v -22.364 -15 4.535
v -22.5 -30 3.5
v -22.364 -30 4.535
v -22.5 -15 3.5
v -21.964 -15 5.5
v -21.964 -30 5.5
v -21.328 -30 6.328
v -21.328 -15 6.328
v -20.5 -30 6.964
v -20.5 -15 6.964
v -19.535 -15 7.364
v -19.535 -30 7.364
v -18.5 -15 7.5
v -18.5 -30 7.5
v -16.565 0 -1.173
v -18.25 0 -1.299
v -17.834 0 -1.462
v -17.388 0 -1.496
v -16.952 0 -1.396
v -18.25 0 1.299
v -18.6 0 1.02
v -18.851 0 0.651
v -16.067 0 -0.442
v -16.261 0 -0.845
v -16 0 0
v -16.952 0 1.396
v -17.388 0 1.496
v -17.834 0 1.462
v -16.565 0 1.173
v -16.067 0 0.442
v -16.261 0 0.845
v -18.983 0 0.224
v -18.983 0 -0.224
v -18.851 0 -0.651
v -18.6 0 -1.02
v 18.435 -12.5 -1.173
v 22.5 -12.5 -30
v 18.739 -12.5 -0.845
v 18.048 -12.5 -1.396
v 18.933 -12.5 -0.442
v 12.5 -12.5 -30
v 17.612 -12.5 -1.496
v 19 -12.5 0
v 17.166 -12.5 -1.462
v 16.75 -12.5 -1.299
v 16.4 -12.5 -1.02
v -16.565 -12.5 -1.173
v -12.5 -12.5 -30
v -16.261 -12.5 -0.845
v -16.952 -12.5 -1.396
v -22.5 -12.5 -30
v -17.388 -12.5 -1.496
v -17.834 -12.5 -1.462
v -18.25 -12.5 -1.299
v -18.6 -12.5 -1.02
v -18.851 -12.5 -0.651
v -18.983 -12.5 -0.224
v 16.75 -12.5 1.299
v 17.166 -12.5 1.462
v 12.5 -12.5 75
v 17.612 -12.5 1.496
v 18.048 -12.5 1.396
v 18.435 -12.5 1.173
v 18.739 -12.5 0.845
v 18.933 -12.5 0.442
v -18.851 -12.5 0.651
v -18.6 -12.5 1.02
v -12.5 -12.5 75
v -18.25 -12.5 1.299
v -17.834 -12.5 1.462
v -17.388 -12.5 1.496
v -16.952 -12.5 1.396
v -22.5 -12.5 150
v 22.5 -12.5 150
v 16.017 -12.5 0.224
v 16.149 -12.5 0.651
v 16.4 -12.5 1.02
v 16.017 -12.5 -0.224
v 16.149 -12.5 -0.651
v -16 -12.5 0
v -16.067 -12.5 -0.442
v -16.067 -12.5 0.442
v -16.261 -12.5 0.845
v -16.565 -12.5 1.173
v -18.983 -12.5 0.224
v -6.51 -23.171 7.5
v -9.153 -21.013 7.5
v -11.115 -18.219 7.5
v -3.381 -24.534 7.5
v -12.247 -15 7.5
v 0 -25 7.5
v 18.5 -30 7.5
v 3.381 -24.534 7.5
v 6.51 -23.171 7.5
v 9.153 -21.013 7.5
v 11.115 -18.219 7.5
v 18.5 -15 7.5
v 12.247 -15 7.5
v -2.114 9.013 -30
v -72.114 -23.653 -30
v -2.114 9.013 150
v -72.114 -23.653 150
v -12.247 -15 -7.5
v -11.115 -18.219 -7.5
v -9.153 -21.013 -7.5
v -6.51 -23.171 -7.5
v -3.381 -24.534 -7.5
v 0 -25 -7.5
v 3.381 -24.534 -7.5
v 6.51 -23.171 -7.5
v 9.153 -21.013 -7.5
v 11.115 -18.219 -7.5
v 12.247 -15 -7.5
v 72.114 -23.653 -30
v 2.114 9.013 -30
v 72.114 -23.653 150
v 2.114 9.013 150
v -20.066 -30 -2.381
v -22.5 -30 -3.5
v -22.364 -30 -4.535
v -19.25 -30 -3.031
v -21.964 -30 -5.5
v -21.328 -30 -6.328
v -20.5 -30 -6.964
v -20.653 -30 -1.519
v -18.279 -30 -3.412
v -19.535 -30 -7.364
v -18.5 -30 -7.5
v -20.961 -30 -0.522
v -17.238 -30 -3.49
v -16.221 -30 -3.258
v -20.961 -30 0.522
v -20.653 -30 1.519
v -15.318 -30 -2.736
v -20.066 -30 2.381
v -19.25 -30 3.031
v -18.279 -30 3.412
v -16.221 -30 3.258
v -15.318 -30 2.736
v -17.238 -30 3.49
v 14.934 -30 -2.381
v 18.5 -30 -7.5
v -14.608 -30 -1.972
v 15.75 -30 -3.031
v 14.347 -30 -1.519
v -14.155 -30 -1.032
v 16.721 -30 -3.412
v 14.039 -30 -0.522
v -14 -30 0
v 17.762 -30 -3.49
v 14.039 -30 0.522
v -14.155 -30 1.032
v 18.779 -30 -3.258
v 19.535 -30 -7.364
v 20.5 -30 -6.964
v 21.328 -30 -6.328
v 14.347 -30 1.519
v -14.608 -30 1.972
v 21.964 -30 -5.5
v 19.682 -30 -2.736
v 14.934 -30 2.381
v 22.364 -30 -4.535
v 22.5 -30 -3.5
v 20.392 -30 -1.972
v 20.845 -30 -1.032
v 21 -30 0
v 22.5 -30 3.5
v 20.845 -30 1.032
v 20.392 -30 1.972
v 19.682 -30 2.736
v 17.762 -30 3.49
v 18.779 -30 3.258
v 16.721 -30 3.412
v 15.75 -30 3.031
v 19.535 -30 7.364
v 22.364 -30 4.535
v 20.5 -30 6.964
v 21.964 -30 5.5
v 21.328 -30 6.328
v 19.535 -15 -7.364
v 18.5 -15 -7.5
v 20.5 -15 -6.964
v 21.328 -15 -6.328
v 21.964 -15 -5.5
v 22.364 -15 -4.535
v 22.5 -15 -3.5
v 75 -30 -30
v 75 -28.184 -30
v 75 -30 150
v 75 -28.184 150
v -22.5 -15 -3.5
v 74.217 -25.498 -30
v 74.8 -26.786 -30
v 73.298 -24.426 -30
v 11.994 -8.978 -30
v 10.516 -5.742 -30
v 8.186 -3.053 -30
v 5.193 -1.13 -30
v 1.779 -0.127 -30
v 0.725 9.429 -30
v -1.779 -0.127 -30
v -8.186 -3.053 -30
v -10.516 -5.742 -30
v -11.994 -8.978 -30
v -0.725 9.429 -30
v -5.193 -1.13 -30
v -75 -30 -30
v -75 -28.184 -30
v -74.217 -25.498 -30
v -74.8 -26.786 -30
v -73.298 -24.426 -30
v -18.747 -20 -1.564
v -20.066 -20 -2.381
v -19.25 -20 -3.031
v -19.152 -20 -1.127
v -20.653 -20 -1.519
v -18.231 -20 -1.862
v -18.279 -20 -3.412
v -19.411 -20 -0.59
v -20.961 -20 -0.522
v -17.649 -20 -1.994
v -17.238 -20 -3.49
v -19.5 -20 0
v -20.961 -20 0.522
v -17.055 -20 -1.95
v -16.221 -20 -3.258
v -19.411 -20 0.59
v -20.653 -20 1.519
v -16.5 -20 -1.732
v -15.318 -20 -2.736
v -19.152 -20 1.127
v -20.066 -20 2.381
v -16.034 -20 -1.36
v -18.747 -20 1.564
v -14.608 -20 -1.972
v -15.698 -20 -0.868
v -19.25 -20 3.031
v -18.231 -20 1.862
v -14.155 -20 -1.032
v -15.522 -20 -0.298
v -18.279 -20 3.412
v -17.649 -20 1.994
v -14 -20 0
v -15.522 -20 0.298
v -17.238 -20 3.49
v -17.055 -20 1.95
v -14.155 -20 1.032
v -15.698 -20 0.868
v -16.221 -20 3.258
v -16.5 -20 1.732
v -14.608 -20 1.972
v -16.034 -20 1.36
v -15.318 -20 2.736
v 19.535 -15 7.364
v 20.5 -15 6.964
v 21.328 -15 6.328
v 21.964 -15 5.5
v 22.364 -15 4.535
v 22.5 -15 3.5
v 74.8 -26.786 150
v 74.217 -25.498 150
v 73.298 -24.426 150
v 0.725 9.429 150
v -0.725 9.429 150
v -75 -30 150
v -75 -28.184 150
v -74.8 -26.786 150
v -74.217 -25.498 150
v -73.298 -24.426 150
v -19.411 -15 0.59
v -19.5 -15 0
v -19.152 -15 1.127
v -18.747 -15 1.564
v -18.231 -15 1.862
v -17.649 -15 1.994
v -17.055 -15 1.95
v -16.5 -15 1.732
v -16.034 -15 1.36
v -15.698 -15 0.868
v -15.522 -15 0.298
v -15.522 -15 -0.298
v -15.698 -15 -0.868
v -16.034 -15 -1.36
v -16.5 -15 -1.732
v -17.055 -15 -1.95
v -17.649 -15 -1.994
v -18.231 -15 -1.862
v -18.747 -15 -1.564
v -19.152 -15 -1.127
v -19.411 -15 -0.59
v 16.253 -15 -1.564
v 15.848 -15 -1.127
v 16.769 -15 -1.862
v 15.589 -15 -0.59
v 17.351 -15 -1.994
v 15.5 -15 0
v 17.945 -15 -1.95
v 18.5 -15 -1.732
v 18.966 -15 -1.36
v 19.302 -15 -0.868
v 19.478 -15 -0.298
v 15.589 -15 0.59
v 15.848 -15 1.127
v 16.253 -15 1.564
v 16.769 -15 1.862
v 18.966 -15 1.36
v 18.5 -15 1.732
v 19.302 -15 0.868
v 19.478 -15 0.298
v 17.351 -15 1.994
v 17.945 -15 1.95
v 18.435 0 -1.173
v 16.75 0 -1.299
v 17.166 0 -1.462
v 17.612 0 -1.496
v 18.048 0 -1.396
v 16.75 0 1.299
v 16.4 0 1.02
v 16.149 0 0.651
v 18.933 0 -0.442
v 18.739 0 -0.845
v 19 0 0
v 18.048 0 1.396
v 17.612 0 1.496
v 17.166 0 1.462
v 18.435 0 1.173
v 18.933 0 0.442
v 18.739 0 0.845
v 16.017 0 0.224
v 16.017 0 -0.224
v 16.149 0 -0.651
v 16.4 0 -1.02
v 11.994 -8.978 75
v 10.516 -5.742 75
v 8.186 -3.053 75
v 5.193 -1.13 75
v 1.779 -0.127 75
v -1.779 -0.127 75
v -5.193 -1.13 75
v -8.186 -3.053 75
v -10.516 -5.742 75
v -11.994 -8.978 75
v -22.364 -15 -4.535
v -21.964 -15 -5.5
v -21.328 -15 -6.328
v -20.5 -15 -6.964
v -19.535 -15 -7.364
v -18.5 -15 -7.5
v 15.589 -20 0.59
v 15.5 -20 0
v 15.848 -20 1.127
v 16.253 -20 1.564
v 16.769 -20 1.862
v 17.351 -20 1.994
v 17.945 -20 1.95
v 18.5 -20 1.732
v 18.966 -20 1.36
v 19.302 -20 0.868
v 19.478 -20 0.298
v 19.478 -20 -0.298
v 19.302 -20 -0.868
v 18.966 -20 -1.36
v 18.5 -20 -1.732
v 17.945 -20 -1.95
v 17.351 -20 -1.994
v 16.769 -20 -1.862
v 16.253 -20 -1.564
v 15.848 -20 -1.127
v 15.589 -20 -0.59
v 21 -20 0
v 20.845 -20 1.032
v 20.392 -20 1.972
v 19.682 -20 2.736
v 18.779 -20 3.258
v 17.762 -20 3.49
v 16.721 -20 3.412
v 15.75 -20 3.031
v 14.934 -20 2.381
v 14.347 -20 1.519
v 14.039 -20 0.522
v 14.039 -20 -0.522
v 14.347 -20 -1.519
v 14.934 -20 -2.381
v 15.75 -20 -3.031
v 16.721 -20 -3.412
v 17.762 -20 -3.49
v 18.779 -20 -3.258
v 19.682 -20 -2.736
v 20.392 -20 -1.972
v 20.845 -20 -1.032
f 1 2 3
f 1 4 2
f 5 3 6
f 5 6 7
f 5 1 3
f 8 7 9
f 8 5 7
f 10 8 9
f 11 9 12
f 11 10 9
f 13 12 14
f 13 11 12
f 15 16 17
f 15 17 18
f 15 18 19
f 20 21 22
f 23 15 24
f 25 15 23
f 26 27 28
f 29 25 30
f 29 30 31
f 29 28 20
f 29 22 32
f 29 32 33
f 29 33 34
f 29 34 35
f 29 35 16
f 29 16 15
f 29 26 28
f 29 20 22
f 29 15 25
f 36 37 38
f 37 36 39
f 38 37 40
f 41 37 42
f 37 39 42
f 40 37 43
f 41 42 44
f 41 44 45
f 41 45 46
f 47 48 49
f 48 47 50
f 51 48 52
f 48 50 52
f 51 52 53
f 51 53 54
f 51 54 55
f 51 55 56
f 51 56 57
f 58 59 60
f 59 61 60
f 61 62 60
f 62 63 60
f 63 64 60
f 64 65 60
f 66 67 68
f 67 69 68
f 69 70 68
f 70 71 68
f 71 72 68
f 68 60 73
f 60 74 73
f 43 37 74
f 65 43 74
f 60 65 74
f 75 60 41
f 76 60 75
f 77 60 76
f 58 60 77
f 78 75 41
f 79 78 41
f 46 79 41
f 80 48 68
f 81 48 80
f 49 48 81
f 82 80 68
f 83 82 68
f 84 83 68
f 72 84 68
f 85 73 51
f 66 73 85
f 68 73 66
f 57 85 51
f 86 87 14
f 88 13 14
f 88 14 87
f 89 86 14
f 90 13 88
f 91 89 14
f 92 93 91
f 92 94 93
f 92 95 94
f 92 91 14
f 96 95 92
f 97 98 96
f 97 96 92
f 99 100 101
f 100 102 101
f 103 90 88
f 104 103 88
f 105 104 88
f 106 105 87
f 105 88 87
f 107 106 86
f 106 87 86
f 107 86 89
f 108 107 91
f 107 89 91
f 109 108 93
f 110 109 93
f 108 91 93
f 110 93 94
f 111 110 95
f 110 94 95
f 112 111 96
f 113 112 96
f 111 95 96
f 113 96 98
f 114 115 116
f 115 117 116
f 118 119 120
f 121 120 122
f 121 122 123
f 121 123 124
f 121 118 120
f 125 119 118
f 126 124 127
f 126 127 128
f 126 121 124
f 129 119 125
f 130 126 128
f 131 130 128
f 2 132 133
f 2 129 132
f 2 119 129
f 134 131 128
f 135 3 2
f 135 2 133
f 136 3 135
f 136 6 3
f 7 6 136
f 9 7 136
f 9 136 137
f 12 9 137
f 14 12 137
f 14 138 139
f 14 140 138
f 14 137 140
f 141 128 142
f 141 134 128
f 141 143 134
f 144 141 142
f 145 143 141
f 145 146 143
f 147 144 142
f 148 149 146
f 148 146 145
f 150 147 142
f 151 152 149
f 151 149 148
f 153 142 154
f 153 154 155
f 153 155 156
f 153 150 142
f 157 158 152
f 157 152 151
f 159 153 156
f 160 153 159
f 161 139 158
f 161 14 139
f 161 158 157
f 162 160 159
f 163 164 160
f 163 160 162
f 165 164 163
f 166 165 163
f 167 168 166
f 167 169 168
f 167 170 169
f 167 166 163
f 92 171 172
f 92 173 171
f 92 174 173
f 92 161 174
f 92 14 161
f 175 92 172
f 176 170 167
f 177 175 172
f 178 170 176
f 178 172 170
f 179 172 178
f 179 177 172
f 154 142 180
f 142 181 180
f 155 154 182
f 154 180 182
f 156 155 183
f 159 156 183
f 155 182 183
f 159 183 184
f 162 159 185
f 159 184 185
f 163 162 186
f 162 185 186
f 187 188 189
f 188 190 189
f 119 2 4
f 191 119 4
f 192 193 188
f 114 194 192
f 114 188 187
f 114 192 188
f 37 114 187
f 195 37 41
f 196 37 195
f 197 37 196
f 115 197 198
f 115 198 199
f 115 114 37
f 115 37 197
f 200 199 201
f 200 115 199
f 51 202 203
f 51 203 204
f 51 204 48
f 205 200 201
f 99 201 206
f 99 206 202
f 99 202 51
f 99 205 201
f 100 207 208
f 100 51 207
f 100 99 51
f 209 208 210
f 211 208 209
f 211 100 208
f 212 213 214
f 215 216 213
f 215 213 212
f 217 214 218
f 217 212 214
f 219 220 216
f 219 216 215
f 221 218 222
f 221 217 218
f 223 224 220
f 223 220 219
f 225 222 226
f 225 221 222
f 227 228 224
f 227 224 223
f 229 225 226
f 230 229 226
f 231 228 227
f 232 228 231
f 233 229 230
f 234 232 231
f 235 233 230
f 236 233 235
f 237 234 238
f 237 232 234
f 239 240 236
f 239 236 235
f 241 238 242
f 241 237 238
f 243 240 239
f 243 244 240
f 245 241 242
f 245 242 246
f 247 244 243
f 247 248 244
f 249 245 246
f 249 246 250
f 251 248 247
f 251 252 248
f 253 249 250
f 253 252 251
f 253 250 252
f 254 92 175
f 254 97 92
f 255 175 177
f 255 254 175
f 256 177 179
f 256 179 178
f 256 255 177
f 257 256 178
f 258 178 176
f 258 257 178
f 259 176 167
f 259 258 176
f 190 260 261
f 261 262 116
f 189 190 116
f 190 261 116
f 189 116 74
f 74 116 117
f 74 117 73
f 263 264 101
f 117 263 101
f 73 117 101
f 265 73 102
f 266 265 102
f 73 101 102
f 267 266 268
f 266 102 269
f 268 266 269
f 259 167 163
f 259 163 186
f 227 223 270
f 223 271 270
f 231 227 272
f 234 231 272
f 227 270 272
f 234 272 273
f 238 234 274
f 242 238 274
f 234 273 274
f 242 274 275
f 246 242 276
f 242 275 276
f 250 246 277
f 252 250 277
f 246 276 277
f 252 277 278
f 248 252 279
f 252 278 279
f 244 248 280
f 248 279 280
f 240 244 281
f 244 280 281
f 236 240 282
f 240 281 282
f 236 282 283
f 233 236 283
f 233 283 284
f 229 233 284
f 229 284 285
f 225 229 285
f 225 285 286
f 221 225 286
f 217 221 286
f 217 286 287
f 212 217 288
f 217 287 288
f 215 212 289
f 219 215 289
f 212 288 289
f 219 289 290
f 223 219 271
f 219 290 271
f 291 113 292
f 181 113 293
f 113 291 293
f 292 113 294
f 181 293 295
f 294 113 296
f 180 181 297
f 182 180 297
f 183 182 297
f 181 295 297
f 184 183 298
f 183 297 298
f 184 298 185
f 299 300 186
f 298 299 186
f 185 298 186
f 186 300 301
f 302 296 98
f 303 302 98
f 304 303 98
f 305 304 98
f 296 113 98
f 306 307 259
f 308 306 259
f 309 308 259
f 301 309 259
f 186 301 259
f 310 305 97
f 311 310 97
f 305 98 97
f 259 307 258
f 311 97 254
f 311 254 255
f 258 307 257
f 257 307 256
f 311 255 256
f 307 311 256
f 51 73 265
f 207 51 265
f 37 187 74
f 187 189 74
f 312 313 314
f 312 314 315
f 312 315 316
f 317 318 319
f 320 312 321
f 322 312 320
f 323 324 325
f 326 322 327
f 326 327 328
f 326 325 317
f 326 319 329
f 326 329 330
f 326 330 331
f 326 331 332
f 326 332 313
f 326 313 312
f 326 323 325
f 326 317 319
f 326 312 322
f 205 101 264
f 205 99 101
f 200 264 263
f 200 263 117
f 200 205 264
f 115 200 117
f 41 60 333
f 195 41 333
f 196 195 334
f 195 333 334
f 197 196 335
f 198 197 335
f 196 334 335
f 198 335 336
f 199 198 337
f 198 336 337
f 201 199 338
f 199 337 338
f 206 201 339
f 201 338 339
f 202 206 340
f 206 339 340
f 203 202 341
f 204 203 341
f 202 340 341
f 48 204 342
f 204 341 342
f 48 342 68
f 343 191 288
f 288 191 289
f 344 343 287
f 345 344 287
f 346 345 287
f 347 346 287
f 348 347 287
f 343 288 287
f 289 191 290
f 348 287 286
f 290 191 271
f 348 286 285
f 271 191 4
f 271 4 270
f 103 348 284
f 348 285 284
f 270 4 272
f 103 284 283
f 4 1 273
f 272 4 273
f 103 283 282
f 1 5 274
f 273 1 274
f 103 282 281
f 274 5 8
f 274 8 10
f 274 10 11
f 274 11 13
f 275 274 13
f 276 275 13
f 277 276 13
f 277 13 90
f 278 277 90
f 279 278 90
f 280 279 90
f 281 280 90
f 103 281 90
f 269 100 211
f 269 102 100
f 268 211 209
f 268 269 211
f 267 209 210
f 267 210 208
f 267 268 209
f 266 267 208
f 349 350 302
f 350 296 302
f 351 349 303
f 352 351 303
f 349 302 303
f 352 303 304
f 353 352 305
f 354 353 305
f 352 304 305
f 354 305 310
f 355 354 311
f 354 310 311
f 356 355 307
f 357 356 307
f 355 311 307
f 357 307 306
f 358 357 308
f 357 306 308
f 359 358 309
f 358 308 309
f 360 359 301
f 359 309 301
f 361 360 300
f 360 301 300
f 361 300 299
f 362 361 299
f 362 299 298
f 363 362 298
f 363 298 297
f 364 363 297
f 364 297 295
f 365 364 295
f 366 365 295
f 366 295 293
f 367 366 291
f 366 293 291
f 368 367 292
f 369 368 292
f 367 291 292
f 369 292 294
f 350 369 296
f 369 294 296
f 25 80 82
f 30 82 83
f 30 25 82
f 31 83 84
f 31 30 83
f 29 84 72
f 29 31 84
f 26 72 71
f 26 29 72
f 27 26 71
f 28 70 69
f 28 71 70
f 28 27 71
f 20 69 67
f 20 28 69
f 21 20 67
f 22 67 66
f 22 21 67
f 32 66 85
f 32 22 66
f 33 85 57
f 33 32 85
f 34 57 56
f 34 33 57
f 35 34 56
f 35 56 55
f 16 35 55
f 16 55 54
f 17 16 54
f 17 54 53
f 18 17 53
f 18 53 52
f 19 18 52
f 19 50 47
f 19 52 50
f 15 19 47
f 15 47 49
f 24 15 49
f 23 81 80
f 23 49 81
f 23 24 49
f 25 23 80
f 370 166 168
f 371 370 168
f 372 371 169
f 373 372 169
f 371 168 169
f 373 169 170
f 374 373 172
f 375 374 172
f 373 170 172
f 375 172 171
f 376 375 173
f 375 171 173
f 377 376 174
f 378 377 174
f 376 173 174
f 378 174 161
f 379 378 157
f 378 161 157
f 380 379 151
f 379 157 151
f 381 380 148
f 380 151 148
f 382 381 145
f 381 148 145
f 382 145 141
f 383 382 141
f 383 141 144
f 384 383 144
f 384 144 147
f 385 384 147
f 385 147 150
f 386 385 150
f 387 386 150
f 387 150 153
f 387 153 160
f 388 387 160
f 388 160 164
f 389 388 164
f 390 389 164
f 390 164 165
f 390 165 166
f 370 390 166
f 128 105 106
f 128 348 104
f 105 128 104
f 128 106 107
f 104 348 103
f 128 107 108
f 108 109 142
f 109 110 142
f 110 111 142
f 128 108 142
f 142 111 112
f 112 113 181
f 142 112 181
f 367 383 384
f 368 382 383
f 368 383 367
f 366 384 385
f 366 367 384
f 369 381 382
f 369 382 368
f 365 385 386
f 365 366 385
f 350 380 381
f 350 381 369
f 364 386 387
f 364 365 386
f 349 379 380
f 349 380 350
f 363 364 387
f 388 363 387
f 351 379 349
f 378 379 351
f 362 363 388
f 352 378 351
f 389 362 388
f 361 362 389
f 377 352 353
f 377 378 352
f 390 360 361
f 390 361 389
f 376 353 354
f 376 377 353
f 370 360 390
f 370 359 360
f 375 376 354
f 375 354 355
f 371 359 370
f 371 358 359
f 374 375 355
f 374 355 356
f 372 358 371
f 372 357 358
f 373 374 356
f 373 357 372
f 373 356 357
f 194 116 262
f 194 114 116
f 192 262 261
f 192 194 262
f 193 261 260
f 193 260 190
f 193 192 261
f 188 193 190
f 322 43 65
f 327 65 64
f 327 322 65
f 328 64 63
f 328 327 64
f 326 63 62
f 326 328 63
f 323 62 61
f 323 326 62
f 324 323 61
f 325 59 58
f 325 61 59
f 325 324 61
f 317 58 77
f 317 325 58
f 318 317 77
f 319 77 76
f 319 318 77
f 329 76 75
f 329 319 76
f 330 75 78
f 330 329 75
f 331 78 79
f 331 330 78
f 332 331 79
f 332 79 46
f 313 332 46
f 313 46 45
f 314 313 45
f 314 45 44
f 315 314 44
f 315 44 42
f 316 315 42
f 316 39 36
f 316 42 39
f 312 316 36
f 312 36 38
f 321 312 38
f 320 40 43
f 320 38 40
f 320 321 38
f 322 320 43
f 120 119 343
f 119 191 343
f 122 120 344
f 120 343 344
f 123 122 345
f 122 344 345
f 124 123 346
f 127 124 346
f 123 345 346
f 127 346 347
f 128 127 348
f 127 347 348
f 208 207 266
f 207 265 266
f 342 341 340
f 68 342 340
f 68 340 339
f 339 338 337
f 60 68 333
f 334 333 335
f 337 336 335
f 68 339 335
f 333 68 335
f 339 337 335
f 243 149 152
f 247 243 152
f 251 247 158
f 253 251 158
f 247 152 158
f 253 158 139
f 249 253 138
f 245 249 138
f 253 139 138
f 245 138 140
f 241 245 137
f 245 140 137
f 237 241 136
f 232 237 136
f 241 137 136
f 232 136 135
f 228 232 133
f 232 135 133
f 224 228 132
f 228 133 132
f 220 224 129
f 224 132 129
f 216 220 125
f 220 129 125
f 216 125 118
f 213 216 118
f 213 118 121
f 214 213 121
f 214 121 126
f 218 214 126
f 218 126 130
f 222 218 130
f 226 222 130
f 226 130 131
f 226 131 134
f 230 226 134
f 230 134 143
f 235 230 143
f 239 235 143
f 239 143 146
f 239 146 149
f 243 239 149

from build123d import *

# Parameters (mm, degrees)
PAD_DEPTH        = 150
PAD001_DEPTH     = 30
SKETCH002_R      = 1.5
POCKET001_DEPTH  = 30.001
SKETCH001_R      = 12.5
POCKET_DEPTH     = 75
FILLET_R         = 5
SKETCH003_W      = 45
SKETCH003_H      = 15
PAD002_DEPTH     = 7.5
SKETCH004_R      = 12.5
POCKET002_DEPTH  = 10
HOLE_D           = 4
HOLE_DEPTH       = 25
HOLE_CBORE_D     = 7
HOLE_CBORE_DEPTH = 10
FILLET001_R      = 4


with BuildPart() as roof:
    # Sketch → Pad (new body)
    with BuildSketch(Plane.XY):
        Polygon((-75, -25), (0, 10), (75, -25), (75, -30), (22.5, -12.5), (-22.5, -12.5), (-75, -30), align=None)
    extrude(amount=PAD_DEPTH)

    # Sketch → Pad001 (join)
    with BuildSketch(Plane.XY):
        Polygon((-75, -25), (0, 10), (75, -25), (75, -30), (22.5, -12.5), (-22.5, -12.5), (-75, -30), align=None)
    extrude(amount=-PAD001_DEPTH)

    # Sketch002 → Pocket001 (cut, through all)
    with BuildSketch(Plane.XZ):
        with Locations((17.5, 0)):
            Circle(SKETCH002_R)
        with Locations((-17.5, 0)):
            Circle(SKETCH002_R)
    extrude(amount=POCKET001_DEPTH, mode=Mode.SUBTRACT)

    # Sketch001 → Pocket (cut, symmetric)
    with BuildSketch(Plane.XY):
        with Locations((0, -12.5)):
            Circle(SKETCH001_R)
    extrude(amount=POCKET_DEPTH, both=True, mode=Mode.SUBTRACT)

    # Fillet
    fillet_edges = [roof.edges().sort_by_distance(p)[0] for p in [
        (75, -25, 75),
        (75, -25, -15),
        (-75, -25, -15),
        (-75, -25, 75),
        (0, 10, 75),
        (0, 10, -15),
    ]]
    fillet(fillet_edges, radius=FILLET_R)


with BuildPart() as fastening_bracket:
    # Sketch003 → Pad002 (new body, symmetric)
    with BuildSketch(Plane.XY):
        with Locations((0, -22.5)):
            Rectangle(SKETCH003_W, SKETCH003_H)
    extrude(amount=PAD002_DEPTH, both=True)

    # Sketch004 → Pocket002 (cut, symmetric)
    with BuildSketch(Plane.XY):
        with Locations((0, -12.5)):
            Circle(SKETCH004_R)
    extrude(amount=POCKET002_DEPTH, both=True, mode=Mode.SUBTRACT)

    # Hole
    with Locations(Plane.XZ.offset(30)):
        with Locations((-17.5, 0), (17.5, 0)):
            CounterBoreHole(HOLE_D / 2, HOLE_CBORE_D / 2, HOLE_CBORE_DEPTH, depth=HOLE_DEPTH)

    # Fillet001
    fillet001_edges = [fastening_bracket.edges().sort_by_distance(p)[0] for p in [
        (-22.5, -22.5, 7.5),
        (-22.5, -22.5, -7.5),
        (22.5, -22.5, 7.5),
        (22.5, -22.5, -7.5),
    ]]
    fillet(fillet001_edges, radius=FILLET001_R)


solid = Compound([roof.part, fastening_bracket.part])
